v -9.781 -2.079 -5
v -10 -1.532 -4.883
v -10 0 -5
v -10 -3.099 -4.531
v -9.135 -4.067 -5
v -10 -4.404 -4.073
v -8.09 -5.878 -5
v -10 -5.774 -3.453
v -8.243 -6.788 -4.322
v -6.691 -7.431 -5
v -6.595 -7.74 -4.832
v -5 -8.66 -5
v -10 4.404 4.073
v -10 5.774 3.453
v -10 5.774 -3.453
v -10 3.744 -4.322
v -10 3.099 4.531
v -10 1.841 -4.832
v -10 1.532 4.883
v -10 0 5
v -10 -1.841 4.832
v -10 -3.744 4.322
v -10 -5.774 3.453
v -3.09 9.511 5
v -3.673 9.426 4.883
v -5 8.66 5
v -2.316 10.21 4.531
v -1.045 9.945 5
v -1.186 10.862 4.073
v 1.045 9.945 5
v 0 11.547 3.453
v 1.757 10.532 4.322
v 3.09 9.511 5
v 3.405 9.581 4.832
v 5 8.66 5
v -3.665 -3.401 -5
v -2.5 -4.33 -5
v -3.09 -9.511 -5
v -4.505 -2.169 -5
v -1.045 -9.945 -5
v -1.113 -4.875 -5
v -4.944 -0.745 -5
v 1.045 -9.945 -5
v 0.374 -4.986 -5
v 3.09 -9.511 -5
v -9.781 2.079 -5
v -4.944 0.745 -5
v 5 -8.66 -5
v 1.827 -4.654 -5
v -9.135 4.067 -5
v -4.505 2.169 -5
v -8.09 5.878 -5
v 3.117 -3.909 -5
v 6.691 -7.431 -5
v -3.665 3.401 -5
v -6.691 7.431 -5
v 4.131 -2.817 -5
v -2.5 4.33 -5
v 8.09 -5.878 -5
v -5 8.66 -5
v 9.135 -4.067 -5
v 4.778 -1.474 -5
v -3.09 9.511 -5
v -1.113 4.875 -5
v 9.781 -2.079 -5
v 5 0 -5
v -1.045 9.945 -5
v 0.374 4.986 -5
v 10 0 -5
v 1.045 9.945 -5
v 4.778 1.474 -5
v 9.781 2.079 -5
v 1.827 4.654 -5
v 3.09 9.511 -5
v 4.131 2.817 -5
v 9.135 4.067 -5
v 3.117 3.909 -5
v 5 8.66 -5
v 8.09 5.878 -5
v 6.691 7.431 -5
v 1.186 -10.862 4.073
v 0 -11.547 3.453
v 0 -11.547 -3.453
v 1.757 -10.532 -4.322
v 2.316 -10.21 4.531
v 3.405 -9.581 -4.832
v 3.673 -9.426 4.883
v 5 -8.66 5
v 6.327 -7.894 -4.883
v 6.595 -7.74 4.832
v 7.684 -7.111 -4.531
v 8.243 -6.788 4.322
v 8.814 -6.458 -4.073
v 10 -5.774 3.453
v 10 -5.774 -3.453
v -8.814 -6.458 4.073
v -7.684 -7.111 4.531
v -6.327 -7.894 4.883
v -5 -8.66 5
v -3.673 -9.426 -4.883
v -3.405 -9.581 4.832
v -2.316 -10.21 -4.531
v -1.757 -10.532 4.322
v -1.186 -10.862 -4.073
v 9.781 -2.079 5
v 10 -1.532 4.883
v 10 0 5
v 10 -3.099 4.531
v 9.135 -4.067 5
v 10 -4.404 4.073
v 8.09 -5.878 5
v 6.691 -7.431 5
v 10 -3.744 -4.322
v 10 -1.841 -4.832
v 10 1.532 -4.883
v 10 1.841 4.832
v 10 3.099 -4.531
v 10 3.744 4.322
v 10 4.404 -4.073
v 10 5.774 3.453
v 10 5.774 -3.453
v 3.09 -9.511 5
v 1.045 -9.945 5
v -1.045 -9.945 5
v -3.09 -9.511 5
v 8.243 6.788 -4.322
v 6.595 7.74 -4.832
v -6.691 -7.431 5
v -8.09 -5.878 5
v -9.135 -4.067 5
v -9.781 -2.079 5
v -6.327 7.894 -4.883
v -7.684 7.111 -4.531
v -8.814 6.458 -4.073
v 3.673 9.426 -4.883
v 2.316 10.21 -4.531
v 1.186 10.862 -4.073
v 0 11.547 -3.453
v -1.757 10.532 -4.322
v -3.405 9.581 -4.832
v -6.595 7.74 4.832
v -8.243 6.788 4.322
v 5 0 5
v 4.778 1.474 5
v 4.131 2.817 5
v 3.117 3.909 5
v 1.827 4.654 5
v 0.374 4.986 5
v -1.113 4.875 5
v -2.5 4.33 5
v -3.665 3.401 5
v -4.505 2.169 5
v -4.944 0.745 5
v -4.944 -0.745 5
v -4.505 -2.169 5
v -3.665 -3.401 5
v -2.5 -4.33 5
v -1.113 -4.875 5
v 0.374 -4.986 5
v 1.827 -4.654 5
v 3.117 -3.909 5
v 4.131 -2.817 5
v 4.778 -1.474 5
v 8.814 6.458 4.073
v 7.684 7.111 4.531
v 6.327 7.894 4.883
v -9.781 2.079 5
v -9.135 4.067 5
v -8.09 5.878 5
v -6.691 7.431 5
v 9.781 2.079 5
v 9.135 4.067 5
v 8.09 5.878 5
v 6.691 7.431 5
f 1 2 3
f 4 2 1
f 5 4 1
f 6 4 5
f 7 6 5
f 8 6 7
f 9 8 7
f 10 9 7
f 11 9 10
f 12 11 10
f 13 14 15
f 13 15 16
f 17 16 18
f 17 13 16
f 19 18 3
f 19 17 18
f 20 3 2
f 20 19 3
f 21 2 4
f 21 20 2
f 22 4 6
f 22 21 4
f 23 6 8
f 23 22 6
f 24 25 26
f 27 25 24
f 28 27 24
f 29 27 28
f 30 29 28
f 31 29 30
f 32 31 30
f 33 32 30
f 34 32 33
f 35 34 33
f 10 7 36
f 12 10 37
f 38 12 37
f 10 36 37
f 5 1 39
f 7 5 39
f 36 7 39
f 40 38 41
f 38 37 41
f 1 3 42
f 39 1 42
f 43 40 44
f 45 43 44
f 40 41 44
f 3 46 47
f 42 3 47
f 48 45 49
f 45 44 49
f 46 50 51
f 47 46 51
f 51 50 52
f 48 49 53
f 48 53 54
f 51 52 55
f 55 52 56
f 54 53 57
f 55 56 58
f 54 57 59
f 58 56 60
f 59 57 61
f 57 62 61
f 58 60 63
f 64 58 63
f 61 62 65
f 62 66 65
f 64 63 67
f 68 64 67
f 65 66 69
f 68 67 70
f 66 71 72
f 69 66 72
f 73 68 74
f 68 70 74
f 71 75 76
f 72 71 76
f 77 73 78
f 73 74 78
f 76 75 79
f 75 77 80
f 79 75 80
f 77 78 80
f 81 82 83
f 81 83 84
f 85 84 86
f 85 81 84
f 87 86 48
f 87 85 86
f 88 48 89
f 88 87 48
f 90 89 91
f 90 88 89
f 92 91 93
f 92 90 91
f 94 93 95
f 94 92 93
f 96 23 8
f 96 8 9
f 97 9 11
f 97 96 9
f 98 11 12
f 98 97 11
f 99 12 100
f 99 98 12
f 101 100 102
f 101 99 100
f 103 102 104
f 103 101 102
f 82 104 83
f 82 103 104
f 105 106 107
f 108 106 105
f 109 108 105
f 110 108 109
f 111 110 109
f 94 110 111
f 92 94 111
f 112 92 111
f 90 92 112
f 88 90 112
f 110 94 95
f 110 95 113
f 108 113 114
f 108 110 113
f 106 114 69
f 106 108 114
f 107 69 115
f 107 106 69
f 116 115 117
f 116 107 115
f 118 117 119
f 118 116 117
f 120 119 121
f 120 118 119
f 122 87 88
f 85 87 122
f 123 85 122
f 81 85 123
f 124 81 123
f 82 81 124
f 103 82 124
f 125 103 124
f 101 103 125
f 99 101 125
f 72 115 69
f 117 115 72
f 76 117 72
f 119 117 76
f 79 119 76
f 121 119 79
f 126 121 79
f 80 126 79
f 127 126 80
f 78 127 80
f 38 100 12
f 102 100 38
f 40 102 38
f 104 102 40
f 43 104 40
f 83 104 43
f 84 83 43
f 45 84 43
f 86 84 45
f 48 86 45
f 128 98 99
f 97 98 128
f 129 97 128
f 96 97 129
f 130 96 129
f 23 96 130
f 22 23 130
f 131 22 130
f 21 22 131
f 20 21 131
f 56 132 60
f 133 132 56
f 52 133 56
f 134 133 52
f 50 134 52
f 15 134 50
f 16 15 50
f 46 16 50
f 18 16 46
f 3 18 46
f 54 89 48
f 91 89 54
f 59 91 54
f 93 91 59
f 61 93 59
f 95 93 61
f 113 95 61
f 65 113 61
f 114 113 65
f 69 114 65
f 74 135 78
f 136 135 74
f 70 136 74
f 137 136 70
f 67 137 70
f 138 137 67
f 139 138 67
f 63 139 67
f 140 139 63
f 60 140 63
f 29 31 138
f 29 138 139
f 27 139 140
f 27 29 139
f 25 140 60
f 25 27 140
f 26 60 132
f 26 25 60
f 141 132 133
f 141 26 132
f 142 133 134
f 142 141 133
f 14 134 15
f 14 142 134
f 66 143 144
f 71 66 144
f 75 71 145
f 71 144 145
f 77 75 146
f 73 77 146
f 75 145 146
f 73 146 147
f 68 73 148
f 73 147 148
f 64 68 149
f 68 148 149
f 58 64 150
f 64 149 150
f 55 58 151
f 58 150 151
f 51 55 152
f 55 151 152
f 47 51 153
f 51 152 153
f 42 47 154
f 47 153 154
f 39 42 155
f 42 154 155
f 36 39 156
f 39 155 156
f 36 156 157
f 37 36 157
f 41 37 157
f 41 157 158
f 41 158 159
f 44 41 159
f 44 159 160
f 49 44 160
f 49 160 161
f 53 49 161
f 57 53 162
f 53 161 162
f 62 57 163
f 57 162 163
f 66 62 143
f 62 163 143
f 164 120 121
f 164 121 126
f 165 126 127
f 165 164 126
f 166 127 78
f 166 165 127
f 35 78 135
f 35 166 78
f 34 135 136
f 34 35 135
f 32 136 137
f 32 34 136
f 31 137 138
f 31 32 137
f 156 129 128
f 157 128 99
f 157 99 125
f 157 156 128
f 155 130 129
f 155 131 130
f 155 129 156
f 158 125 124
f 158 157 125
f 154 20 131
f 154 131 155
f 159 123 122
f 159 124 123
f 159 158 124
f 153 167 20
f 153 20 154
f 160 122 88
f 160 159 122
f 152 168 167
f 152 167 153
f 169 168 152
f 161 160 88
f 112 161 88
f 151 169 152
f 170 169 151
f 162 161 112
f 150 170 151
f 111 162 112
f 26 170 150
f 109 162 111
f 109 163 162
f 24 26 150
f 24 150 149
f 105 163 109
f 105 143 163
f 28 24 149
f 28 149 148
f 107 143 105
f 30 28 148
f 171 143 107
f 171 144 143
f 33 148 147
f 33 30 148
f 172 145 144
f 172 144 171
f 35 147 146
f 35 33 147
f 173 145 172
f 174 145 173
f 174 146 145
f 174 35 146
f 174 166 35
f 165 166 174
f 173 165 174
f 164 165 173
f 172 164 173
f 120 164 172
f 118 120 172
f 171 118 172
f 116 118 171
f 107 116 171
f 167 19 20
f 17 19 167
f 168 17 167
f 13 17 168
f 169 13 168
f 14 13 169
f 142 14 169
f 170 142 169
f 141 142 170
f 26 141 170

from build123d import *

# Parameters (mm, degrees)
EXTRUDE1_DEPTH    = 5
SKETCH2_R         = 5
EXTRUDE2_DEPTH    = 10
SKETCH3_OUTSIDE_W = 48.43
SKETCH3_OUTSIDE_H = 51.524
SKETCH3_OUTSIDE_R = 10
EXTRUDE4_DEPTH    = 10
EXTRUDE4_TAPER    = 45
SKETCH4_OUTSIDE_W = 48.43
SKETCH4_OUTSIDE_H = 51.524
SKETCH4_OUTSIDE_R = 10
EXTRUDE5_DEPTH    = 10
EXTRUDE5_TAPER    = 45


with BuildPart() as part:
    # Sketch1 → Extrude1 (new, symmetric)
    with BuildSketch(Plane.XY):
        Polygon((0, 11.547005384), (-10, 5.773502692), (-10, -5.773502692), (0, -11.547005384), (10, -5.773502692), (10, 5.773502692), align=None)
    extrude(amount=EXTRUDE1_DEPTH, both=True)

    # Sketch2 → Extrude2 (cut)
    with BuildSketch(Plane.XY.offset(5)):
        Circle(SKETCH2_R)
    extrude(amount=-EXTRUDE2_DEPTH, mode=Mode.SUBTRACT)

    # Sketch3 outside → Extrude4 (cut)
    with BuildSketch(Plane.XY.offset(5)):
        Rectangle(SKETCH3_OUTSIDE_W, SKETCH3_OUTSIDE_H)
        Circle(SKETCH3_OUTSIDE_R, mode=Mode.SUBTRACT)
    extrude(amount=-EXTRUDE4_DEPTH, taper=EXTRUDE4_TAPER, mode=Mode.SUBTRACT)

    # Sketch4 outside → Extrude5 (cut)
    with BuildSketch(Plane(origin=(0, 0, -5), x_dir=(-1, 0, 0), z_dir=(0, 0, -1))):
        Rectangle(SKETCH4_OUTSIDE_W, SKETCH4_OUTSIDE_H)
        Circle(SKETCH4_OUTSIDE_R, mode=Mode.SUBTRACT)
    extrude(amount=-EXTRUDE5_DEPTH, taper=EXTRUDE5_TAPER, mode=Mode.SUBTRACT)


solid = part.part
